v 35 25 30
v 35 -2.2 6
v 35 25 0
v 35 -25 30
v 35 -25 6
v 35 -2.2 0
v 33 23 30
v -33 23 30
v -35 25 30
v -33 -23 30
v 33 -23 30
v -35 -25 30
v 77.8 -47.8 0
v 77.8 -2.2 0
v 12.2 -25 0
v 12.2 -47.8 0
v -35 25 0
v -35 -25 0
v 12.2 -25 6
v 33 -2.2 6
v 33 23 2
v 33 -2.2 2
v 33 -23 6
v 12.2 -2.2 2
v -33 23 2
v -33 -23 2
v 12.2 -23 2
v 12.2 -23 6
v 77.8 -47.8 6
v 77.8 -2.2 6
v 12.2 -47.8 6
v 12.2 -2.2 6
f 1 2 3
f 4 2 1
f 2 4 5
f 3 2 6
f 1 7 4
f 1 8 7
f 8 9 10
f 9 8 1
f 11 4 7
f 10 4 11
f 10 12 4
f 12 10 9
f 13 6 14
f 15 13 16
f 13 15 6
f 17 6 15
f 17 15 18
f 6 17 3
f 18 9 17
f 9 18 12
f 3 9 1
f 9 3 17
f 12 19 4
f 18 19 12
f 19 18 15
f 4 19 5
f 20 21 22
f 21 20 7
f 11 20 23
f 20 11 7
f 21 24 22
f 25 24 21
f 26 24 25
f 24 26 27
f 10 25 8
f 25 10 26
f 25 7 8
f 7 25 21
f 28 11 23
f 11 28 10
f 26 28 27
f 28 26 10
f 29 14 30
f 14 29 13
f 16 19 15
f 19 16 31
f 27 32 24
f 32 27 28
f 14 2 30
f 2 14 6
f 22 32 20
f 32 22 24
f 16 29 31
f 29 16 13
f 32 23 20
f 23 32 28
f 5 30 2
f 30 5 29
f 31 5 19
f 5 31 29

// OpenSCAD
// Two-part enclosure for a small electronics board (e.g. Arduino-based temperature logger)
// Print orientation: both parts lie on the bed, side by side, with a 10 mm gap.
// The lid is printed upside down so its lip forms an overhang (a solid block here).

// ---------------- Parameters ----------------
box_x      = 70;    // box outer length (X)
box_y      = 50;    // box outer width (Y)
box_z      = 30;    // box outer height (Z)
wall       = 2;     // box wall thickness
floor      = 2;     // box floor thickness

lip_t      = 1.5;   // lid lip thickness
lip_h      = 4;     // lid lip height (from plate top)
lip_x      = 65.6;  // lip outer length (X)
lip_y      = 45.6;  // lip outer width (Y)
lip_over   = 0.2;   // lip overlap into box opening (clearance on each side)

eps        = 0.5;   // cutter overshoot past faces
gap        = 10;    // gap between the two parts on the bed
$fn        = 64;    // curve resolution

// ---------------- Derived ----------------
box_int_x  = box_x - 2 * wall;   // opening length
box_int_y  = box_y - 2 * wall;   // opening width
lip_inset  = (lip_x - box_int_x) / 2 - lip_over;  // lip edge inside the opening

// ---------------- Model ----------------
union() {
    // Part 1: open-top box
    translate([-box_x / 2, -box_y / 2, 0])
        difference() {
            cube([box_x, box_y, box_z]);
            translate([wall, wall, floor])
                cube([box_int_x, box_int_y, box_z - floor + eps]);  // open top
        }

    // Part 2: lid (printed upside down: plate on bed, lip on top)
    translate([box_x / 2 + gap, -box_y / 2, 0])
        union() {
            // base plate
            translate([-lip_x / 2, -lip_y / 2, 0])
                cube([lip_x, lip_y, 2]);
            // rectangular lip wall, centred on the plate
            translate([-lip_x / 2, -lip_y / 2, 2])
                cube([lip_x, lip_y, lip_h]);
        }
}
